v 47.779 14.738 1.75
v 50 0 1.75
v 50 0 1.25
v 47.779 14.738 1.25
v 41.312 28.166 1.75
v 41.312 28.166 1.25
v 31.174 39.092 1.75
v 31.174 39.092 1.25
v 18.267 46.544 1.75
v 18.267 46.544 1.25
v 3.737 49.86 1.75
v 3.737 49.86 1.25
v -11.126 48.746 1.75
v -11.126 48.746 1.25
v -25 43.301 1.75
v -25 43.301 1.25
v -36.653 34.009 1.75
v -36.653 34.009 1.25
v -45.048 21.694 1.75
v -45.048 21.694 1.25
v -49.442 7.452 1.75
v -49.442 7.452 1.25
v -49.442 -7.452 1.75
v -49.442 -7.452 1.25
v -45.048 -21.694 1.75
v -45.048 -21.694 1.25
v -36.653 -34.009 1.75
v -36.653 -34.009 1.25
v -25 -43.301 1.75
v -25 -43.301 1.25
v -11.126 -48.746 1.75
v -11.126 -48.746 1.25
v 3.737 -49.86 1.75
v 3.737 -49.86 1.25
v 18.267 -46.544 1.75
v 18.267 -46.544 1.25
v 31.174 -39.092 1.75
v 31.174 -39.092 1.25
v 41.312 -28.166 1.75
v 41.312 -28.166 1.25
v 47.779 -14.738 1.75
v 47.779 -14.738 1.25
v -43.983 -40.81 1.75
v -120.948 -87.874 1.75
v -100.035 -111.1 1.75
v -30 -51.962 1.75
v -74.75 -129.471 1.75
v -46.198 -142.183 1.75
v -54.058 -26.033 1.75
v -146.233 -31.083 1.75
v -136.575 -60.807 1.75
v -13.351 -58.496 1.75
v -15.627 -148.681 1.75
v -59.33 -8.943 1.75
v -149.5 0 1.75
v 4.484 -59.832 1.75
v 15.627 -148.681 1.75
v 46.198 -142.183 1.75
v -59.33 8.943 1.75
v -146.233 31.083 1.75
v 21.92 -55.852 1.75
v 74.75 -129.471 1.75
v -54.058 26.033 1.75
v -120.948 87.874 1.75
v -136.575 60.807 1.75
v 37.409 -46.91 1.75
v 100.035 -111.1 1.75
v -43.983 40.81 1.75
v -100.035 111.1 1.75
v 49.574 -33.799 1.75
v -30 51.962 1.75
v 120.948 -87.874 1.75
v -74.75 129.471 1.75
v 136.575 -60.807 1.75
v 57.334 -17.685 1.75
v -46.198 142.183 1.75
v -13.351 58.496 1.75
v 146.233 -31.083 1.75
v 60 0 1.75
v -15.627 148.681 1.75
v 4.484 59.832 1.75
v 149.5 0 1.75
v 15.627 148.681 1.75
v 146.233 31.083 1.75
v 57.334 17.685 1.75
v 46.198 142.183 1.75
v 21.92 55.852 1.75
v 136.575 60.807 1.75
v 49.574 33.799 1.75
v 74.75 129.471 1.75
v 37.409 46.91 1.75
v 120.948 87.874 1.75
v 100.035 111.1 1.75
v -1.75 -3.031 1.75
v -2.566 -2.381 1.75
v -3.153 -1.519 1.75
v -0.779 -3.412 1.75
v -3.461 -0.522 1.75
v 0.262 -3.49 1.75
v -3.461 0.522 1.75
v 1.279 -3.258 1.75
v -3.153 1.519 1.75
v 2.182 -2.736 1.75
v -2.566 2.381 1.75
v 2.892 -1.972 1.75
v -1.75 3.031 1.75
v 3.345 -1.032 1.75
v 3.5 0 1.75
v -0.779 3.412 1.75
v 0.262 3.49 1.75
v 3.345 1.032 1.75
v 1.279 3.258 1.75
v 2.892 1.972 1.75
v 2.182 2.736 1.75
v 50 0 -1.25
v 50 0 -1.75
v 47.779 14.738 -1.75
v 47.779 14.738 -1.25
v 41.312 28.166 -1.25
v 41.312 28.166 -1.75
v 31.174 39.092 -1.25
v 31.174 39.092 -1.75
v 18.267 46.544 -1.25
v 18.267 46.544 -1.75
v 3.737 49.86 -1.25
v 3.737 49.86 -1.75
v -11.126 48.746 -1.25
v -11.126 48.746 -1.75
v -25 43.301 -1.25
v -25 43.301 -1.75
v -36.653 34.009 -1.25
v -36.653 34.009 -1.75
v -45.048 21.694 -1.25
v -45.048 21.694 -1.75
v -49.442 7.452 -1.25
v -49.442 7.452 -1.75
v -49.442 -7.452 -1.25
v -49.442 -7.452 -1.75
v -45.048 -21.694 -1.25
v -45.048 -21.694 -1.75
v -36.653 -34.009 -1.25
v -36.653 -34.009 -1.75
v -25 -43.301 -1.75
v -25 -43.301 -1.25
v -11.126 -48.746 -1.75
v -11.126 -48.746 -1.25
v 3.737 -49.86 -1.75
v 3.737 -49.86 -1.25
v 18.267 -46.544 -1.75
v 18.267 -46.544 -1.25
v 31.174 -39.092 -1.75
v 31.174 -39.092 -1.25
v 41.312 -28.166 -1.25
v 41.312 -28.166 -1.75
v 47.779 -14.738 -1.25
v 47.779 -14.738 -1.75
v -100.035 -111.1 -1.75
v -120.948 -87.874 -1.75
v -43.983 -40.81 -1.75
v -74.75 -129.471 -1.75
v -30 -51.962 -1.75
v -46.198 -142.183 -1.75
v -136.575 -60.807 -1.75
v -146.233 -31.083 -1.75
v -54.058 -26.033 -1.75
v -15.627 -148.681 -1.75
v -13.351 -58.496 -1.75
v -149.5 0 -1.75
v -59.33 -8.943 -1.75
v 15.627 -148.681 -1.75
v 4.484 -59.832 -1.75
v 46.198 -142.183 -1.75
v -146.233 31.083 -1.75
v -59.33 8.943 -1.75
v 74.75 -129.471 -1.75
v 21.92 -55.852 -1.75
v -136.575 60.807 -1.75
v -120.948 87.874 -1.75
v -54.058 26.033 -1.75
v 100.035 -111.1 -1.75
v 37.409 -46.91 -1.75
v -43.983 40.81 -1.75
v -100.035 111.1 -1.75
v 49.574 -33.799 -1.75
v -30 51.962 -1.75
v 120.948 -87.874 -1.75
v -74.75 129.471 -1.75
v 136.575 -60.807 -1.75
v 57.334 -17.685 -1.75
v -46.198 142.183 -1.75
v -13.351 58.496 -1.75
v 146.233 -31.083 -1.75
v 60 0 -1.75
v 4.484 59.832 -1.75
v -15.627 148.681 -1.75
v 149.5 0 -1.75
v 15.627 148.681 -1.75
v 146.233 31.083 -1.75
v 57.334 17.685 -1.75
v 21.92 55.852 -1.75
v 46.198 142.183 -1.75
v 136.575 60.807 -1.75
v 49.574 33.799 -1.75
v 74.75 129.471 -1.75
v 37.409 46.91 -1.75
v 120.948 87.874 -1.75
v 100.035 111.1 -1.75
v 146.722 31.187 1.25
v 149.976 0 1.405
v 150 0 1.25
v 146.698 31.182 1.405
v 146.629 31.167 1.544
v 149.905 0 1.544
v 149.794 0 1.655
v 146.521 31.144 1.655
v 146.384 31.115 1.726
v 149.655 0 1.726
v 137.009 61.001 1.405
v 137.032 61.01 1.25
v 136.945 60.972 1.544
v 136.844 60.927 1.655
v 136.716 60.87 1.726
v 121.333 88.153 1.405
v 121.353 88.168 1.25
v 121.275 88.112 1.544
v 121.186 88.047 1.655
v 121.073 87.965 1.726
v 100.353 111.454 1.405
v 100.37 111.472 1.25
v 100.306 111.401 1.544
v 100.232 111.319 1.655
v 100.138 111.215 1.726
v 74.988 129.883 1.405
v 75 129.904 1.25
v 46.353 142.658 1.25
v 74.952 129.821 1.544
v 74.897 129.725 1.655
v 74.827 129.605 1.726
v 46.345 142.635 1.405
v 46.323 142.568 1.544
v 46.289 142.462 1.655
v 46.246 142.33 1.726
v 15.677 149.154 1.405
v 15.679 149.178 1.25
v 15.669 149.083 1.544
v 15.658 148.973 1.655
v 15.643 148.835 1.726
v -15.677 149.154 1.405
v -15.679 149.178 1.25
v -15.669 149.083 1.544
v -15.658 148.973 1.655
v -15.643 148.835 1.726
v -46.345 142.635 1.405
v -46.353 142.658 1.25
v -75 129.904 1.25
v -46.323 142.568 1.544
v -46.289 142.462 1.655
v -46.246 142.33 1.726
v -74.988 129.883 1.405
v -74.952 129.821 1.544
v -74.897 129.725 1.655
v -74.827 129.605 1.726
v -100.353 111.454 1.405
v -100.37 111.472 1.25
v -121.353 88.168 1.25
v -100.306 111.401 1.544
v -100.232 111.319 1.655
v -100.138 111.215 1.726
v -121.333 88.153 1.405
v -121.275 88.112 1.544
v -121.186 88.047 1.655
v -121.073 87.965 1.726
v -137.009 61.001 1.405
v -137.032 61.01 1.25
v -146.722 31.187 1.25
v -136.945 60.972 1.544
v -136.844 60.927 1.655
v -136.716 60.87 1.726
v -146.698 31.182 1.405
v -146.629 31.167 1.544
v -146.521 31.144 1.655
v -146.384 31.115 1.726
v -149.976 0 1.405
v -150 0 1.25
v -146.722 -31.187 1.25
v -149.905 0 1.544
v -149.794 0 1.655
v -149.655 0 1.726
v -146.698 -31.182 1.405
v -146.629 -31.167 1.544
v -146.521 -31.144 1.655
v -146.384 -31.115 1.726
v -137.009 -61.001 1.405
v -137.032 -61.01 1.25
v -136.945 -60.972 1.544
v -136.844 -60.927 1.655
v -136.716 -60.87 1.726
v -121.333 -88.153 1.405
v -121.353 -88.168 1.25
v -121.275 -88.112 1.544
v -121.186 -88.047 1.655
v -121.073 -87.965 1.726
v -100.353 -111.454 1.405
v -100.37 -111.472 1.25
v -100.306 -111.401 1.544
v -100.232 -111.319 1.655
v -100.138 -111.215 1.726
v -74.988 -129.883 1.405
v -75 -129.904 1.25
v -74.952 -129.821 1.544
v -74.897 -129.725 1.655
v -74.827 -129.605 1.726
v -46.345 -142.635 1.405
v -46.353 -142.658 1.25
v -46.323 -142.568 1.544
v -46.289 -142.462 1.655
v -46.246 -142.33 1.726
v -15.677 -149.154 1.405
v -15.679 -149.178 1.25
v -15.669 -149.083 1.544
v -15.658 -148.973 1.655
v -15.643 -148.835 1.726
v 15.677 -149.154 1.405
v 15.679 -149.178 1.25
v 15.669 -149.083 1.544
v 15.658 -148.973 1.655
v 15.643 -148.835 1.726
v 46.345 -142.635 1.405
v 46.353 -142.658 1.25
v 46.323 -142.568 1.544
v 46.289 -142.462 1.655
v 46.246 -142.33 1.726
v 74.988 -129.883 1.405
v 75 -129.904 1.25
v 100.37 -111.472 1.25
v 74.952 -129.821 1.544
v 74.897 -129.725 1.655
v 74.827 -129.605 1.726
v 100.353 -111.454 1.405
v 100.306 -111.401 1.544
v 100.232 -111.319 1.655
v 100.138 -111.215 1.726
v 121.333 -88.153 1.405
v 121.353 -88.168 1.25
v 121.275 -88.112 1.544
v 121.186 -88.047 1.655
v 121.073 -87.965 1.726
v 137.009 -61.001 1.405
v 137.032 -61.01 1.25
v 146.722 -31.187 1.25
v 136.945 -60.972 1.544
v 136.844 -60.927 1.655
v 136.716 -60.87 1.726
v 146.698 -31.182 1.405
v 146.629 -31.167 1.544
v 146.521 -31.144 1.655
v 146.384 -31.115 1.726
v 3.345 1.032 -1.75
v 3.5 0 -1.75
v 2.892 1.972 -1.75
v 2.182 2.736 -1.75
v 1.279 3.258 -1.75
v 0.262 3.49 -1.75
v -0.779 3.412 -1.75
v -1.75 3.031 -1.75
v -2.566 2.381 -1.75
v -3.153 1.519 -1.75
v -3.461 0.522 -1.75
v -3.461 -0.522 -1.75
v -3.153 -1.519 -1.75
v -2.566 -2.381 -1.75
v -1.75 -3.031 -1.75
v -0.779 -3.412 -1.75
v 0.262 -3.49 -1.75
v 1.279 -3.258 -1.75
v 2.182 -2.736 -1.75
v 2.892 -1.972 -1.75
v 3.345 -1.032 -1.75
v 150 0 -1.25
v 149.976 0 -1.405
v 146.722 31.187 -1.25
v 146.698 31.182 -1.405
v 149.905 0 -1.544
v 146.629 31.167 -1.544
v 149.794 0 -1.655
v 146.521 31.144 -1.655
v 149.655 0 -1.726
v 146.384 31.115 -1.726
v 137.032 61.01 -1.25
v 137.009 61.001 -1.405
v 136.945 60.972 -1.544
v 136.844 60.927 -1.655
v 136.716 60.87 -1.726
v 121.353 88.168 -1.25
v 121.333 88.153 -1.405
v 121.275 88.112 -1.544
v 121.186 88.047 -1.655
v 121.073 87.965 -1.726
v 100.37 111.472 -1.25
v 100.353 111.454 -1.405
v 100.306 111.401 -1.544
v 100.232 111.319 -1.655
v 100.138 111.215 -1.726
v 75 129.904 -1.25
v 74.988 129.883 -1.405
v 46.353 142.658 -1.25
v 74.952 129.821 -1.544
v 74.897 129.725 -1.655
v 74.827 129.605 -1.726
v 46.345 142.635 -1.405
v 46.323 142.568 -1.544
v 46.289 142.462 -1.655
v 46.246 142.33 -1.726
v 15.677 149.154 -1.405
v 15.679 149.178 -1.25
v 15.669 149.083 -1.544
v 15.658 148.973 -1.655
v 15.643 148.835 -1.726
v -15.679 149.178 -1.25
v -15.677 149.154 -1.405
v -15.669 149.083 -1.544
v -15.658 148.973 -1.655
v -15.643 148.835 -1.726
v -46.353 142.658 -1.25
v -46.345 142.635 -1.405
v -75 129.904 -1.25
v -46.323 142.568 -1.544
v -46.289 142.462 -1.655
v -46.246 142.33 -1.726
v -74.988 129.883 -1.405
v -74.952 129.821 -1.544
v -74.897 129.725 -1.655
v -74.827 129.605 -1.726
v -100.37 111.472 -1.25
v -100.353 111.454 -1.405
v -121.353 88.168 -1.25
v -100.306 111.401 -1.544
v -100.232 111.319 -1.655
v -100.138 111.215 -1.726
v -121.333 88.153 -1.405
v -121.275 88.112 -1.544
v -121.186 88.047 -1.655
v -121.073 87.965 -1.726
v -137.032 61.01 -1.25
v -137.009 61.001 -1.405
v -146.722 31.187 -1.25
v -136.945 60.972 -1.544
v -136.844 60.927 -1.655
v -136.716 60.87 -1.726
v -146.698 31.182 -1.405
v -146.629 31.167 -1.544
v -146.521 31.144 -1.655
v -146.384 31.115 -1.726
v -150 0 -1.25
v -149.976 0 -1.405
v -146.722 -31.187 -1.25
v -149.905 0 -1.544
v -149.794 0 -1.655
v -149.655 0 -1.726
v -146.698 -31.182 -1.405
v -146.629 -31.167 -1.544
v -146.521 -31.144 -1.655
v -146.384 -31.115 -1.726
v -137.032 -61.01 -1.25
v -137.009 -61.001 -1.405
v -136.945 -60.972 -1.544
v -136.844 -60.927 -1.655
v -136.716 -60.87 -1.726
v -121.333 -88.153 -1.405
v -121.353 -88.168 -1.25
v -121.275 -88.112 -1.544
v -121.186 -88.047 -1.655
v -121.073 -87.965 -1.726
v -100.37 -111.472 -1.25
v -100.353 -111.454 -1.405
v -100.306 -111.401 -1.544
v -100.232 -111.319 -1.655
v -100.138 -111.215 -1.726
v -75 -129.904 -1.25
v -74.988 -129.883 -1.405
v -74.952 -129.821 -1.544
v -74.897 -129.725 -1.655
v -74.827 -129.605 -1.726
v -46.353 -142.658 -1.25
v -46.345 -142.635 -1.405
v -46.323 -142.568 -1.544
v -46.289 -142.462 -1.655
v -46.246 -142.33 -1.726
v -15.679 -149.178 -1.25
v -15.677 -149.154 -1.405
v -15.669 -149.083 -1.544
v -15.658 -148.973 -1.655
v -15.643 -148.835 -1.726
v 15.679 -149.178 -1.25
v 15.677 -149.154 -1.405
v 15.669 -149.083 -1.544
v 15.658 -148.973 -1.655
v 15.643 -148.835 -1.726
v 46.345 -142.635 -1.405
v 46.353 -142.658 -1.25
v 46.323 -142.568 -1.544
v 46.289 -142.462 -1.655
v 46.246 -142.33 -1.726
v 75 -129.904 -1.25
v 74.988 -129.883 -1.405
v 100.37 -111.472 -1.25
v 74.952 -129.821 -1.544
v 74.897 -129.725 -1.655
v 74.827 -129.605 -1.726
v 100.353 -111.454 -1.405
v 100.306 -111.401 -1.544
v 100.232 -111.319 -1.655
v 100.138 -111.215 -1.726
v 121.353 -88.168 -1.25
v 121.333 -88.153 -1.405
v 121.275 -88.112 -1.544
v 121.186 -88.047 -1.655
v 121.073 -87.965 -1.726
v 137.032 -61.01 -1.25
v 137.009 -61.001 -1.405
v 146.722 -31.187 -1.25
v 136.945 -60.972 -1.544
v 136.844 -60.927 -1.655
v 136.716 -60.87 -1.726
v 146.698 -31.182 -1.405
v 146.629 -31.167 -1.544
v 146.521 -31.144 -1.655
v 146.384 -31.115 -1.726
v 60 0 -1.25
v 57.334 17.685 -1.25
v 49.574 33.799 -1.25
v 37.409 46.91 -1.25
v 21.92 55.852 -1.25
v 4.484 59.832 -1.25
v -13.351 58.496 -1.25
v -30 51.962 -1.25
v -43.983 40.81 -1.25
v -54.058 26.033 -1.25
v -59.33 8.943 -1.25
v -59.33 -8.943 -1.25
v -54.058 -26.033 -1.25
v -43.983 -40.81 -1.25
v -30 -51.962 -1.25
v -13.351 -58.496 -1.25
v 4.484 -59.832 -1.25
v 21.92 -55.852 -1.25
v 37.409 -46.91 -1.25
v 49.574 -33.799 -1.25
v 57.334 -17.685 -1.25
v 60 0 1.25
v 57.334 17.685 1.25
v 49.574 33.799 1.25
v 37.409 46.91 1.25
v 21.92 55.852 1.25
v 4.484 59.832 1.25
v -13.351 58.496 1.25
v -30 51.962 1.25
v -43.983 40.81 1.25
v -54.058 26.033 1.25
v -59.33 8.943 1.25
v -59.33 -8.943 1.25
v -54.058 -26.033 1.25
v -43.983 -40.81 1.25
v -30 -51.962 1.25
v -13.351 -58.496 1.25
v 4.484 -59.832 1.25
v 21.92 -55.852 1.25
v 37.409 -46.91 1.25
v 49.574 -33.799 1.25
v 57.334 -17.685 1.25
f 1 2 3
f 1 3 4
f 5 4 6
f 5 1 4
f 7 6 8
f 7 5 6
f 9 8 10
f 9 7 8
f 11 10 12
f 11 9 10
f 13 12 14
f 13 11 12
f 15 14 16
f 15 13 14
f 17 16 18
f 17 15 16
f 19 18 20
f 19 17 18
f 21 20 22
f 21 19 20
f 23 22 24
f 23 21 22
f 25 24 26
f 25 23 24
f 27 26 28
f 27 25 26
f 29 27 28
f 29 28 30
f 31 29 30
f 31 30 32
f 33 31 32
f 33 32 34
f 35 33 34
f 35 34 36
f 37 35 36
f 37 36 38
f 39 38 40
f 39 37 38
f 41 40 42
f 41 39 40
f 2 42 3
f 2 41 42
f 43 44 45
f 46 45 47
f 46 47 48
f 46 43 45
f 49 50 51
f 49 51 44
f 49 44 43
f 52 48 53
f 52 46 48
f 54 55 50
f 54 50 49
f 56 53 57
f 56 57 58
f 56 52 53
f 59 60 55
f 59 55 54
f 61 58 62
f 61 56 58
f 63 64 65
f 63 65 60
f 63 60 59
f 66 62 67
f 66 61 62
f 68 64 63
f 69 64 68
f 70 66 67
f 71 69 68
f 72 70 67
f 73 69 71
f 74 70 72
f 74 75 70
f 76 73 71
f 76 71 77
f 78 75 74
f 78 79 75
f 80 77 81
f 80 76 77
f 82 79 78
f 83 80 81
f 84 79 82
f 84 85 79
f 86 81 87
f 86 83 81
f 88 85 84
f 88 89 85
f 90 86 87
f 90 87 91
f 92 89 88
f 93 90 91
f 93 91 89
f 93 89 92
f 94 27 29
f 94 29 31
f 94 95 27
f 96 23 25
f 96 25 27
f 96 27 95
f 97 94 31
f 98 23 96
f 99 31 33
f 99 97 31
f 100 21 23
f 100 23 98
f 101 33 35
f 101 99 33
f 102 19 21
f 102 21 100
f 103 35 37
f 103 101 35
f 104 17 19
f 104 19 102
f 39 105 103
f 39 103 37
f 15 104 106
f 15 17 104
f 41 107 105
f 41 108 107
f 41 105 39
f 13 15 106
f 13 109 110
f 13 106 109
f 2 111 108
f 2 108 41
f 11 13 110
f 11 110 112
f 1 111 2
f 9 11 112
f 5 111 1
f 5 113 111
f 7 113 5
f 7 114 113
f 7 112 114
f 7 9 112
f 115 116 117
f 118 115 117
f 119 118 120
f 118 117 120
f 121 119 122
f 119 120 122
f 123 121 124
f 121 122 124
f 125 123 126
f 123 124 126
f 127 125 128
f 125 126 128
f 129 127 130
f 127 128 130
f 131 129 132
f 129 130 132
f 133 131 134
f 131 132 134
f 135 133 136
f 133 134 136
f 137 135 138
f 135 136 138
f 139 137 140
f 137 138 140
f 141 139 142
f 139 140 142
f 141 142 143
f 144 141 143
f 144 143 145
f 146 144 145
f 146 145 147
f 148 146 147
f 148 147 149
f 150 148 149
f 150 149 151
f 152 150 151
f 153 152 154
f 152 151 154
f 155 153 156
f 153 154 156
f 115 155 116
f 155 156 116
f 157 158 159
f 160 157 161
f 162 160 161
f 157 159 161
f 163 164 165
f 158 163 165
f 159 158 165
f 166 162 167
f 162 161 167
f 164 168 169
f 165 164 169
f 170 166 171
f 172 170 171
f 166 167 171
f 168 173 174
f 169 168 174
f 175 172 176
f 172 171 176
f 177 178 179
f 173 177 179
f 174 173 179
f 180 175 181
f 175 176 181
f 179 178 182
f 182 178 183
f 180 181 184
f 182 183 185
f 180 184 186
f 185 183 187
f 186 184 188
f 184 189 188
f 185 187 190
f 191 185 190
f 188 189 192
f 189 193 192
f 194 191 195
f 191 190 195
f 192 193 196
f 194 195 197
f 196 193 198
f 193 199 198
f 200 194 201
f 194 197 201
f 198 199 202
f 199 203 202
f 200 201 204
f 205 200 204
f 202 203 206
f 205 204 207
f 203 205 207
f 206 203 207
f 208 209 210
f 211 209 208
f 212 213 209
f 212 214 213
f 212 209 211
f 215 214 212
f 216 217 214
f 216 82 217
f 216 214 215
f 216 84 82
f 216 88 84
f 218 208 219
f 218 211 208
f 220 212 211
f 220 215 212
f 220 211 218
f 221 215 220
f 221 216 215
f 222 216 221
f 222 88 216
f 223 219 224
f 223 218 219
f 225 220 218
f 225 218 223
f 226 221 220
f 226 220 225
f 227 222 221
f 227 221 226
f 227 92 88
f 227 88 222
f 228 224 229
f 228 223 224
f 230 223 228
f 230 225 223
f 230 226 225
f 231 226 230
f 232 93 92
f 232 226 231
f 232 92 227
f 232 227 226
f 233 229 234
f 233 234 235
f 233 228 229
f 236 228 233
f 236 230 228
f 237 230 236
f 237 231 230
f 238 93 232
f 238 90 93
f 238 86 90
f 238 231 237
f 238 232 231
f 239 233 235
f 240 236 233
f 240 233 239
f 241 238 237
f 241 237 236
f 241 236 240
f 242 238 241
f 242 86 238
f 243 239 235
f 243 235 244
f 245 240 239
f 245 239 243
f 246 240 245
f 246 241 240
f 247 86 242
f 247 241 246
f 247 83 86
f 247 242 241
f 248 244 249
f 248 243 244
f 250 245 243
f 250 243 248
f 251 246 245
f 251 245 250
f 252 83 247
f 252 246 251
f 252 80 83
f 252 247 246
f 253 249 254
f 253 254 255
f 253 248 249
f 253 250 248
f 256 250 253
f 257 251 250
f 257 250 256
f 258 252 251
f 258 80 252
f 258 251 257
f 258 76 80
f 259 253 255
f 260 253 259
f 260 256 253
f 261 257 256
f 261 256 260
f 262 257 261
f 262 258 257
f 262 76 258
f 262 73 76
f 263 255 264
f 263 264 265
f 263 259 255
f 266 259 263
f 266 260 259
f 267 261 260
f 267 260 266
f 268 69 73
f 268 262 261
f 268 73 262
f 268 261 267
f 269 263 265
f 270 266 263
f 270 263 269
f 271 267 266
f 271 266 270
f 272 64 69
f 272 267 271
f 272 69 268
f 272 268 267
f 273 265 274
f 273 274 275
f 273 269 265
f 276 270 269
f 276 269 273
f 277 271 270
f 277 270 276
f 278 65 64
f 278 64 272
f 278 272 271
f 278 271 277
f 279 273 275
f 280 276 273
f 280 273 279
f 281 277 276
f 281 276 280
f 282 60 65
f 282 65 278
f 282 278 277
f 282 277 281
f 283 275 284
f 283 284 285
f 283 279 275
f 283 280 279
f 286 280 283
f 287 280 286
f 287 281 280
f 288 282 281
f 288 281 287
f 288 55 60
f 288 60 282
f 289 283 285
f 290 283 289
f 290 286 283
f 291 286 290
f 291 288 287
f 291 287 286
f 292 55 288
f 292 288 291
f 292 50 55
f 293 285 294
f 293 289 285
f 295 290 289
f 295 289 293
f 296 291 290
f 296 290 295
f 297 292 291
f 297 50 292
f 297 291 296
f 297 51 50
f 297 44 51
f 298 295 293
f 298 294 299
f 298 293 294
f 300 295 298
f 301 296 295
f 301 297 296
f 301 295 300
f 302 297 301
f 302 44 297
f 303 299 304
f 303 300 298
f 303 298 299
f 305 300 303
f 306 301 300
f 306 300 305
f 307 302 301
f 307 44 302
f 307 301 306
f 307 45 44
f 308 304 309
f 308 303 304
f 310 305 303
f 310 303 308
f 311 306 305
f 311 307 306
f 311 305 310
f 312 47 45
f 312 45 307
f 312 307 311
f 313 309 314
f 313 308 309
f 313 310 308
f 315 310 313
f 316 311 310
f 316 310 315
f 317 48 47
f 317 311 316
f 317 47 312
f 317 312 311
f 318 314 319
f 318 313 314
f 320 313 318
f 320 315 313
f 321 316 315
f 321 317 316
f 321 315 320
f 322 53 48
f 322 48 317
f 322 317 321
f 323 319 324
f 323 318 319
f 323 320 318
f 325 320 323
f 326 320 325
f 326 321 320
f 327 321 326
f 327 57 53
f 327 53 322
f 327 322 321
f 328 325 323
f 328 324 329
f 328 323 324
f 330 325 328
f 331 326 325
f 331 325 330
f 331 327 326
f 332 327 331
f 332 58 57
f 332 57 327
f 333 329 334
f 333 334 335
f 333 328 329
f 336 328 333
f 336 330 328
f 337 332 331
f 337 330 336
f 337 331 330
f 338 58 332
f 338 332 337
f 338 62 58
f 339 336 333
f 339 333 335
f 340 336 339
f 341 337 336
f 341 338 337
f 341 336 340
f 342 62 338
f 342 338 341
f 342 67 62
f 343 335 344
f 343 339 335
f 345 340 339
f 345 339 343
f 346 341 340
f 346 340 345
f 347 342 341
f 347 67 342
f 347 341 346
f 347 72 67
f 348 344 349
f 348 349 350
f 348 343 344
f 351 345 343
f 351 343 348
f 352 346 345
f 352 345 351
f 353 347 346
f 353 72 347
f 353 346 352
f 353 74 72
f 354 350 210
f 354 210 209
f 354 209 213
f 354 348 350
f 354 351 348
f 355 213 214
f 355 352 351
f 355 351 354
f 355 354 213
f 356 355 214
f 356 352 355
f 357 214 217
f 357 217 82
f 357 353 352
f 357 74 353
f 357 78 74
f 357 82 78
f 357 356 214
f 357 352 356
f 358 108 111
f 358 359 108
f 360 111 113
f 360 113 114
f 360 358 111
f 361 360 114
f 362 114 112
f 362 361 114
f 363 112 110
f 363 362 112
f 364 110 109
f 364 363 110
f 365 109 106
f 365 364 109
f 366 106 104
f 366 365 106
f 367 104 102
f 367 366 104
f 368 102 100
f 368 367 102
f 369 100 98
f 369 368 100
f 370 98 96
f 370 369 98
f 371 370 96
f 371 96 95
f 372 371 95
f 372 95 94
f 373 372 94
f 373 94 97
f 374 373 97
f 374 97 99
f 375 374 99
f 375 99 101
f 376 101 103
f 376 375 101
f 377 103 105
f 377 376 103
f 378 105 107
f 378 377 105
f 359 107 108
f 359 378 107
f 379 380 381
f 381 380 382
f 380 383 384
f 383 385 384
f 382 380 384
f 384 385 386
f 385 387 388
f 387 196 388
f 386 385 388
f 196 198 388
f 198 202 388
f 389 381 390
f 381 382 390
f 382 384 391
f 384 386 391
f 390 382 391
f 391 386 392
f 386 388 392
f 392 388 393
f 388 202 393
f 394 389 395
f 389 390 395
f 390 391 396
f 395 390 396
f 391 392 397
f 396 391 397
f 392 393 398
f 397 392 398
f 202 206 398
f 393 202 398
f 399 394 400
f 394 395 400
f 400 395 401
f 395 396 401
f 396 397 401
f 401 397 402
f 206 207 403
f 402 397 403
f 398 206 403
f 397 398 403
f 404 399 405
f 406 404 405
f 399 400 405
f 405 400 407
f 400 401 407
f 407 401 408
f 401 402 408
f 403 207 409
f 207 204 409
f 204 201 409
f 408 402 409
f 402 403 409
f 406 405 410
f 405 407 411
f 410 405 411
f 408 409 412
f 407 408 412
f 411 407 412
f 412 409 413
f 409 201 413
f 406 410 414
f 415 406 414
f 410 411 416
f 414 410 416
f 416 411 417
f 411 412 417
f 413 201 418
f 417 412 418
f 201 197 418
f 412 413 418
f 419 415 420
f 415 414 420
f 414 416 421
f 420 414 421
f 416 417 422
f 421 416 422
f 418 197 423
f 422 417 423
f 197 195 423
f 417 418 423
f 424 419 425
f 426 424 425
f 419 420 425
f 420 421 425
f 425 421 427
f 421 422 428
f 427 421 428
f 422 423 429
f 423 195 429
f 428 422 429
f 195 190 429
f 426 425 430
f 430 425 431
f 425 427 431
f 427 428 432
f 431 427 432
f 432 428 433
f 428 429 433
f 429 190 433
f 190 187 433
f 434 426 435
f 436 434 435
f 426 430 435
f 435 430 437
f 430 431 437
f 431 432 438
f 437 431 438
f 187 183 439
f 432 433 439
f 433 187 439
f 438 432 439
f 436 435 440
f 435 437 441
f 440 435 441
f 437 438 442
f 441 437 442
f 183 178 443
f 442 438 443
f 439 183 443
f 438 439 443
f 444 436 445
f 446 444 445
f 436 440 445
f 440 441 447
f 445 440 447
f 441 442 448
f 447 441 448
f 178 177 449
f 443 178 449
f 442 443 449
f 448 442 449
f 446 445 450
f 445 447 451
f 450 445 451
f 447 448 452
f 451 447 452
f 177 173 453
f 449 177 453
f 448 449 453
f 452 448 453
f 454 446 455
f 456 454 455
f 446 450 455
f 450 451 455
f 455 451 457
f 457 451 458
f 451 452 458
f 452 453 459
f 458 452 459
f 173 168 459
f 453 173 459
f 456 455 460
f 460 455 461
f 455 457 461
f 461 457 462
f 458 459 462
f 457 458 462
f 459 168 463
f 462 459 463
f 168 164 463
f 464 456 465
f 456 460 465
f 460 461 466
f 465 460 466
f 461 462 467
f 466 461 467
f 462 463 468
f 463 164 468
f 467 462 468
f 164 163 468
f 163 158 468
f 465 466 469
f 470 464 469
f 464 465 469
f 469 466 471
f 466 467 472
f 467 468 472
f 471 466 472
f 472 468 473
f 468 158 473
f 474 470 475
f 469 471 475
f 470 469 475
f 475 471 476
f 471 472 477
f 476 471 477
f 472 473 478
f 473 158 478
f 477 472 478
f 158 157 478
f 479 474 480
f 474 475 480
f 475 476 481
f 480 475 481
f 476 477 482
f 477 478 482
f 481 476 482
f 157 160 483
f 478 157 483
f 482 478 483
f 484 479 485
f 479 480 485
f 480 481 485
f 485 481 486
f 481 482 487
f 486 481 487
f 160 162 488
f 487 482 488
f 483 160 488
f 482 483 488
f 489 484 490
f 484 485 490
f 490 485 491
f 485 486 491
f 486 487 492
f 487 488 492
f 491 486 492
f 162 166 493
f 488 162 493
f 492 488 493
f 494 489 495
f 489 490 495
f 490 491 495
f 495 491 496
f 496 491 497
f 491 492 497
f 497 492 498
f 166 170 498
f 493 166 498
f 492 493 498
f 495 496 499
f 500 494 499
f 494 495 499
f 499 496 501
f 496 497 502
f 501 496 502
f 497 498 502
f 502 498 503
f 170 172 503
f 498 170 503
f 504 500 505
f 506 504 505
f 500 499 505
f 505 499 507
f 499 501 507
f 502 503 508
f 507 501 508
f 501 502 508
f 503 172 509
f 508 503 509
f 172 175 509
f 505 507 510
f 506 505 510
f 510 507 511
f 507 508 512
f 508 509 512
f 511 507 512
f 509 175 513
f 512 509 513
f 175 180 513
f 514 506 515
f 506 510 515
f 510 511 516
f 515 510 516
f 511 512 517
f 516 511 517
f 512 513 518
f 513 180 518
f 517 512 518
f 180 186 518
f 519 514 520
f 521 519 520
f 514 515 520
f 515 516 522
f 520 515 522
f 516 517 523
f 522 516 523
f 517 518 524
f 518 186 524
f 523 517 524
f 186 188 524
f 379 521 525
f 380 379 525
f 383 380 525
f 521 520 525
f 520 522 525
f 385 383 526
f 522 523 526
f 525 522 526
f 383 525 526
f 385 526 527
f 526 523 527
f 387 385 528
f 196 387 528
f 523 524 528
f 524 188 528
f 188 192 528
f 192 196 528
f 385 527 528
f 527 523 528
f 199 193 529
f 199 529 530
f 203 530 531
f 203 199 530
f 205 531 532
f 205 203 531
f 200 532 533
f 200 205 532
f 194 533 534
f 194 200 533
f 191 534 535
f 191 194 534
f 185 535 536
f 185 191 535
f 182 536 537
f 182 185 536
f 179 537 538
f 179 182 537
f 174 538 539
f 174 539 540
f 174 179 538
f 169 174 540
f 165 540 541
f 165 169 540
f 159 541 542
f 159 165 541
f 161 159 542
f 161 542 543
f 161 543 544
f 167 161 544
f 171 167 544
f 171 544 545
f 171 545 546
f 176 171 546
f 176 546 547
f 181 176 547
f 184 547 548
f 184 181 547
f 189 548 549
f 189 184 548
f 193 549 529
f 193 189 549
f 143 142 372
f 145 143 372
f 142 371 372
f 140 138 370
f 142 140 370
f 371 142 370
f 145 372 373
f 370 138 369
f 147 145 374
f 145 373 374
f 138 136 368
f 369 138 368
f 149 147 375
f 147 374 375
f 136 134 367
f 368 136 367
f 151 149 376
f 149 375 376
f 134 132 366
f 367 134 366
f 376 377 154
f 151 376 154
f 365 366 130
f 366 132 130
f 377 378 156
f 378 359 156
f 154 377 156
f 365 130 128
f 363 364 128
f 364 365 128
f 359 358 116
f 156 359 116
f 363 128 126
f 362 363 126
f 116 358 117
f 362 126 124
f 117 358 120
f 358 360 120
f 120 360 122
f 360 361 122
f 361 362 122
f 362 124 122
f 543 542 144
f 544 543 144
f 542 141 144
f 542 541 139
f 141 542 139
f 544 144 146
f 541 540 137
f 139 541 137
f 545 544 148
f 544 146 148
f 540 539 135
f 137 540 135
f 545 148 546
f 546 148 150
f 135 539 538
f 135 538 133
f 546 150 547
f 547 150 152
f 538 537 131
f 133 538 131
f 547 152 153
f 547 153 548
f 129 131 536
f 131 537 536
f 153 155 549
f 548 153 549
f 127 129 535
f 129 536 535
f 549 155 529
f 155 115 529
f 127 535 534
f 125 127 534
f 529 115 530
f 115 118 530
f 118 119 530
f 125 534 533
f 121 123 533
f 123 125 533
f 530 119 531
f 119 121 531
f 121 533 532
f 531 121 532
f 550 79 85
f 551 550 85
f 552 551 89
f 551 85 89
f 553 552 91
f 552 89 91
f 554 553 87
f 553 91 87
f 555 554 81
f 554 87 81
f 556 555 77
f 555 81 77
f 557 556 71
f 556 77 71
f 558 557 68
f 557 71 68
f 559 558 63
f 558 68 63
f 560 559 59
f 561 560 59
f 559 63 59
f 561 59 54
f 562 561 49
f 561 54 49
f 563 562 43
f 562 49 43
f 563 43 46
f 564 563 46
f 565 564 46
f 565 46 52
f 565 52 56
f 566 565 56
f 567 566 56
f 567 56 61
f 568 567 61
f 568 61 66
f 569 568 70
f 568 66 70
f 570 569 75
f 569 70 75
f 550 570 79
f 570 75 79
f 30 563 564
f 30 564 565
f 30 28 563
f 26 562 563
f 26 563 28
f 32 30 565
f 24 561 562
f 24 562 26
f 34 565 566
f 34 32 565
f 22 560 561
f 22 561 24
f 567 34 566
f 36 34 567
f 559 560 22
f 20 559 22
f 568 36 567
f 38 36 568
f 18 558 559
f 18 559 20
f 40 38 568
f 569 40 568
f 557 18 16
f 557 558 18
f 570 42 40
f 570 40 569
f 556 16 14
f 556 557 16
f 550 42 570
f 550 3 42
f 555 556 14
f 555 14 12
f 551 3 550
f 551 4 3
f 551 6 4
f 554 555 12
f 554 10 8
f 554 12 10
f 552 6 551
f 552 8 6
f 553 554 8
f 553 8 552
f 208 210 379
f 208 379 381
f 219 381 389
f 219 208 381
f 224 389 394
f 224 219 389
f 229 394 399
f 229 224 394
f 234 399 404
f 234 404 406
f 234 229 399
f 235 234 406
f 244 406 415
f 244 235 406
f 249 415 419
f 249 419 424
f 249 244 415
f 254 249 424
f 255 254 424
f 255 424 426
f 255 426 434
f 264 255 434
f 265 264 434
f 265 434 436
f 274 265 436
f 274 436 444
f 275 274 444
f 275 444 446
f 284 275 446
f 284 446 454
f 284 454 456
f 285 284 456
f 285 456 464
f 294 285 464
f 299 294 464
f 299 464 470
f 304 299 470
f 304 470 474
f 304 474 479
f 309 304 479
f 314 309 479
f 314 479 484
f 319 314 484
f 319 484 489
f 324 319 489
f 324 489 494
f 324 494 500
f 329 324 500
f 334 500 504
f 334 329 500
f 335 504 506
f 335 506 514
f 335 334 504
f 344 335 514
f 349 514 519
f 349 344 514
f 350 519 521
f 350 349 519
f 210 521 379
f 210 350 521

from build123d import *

# Parameters (mm, degrees)
SKETCH_R      = 150
SKETCH_R_2    = 3.5
PAD_DEPTH     = 1.75
FILLET_R      = 0.5
SKETCH001_R   = 60
SKETCH001_R_2 = 50
POCKET_DEPTH  = 0.5


with BuildPart() as part:
    # Sketch → Pad (new body, symmetric)
    with BuildSketch(Plane.XY):
        Circle(SKETCH_R)
        Circle(SKETCH_R_2, mode=Mode.SUBTRACT)
    extrude(amount=PAD_DEPTH, both=True)

    # Fillet
    fillet_edges = [part.edges().sort_by_distance(p)[0] for p in [
        (150, 0, 0),
        (-150, 0, -1.75),
        (-150, 0, 1.75),
    ]]
    fillet(fillet_edges, radius=FILLET_R)

    # Sketch001 → Pocket (cut)
    with BuildSketch(Plane.XY.offset(1.75)):
        Circle(SKETCH001_R)
        Circle(SKETCH001_R_2, mode=Mode.SUBTRACT)
    pocket = extrude(amount=-POCKET_DEPTH, mode=Mode.SUBTRACT)

    # Mirrored: Pocket across XY
    add(pocket.mirror(Plane.XY), mode=Mode.SUBTRACT)


solid = part.part
